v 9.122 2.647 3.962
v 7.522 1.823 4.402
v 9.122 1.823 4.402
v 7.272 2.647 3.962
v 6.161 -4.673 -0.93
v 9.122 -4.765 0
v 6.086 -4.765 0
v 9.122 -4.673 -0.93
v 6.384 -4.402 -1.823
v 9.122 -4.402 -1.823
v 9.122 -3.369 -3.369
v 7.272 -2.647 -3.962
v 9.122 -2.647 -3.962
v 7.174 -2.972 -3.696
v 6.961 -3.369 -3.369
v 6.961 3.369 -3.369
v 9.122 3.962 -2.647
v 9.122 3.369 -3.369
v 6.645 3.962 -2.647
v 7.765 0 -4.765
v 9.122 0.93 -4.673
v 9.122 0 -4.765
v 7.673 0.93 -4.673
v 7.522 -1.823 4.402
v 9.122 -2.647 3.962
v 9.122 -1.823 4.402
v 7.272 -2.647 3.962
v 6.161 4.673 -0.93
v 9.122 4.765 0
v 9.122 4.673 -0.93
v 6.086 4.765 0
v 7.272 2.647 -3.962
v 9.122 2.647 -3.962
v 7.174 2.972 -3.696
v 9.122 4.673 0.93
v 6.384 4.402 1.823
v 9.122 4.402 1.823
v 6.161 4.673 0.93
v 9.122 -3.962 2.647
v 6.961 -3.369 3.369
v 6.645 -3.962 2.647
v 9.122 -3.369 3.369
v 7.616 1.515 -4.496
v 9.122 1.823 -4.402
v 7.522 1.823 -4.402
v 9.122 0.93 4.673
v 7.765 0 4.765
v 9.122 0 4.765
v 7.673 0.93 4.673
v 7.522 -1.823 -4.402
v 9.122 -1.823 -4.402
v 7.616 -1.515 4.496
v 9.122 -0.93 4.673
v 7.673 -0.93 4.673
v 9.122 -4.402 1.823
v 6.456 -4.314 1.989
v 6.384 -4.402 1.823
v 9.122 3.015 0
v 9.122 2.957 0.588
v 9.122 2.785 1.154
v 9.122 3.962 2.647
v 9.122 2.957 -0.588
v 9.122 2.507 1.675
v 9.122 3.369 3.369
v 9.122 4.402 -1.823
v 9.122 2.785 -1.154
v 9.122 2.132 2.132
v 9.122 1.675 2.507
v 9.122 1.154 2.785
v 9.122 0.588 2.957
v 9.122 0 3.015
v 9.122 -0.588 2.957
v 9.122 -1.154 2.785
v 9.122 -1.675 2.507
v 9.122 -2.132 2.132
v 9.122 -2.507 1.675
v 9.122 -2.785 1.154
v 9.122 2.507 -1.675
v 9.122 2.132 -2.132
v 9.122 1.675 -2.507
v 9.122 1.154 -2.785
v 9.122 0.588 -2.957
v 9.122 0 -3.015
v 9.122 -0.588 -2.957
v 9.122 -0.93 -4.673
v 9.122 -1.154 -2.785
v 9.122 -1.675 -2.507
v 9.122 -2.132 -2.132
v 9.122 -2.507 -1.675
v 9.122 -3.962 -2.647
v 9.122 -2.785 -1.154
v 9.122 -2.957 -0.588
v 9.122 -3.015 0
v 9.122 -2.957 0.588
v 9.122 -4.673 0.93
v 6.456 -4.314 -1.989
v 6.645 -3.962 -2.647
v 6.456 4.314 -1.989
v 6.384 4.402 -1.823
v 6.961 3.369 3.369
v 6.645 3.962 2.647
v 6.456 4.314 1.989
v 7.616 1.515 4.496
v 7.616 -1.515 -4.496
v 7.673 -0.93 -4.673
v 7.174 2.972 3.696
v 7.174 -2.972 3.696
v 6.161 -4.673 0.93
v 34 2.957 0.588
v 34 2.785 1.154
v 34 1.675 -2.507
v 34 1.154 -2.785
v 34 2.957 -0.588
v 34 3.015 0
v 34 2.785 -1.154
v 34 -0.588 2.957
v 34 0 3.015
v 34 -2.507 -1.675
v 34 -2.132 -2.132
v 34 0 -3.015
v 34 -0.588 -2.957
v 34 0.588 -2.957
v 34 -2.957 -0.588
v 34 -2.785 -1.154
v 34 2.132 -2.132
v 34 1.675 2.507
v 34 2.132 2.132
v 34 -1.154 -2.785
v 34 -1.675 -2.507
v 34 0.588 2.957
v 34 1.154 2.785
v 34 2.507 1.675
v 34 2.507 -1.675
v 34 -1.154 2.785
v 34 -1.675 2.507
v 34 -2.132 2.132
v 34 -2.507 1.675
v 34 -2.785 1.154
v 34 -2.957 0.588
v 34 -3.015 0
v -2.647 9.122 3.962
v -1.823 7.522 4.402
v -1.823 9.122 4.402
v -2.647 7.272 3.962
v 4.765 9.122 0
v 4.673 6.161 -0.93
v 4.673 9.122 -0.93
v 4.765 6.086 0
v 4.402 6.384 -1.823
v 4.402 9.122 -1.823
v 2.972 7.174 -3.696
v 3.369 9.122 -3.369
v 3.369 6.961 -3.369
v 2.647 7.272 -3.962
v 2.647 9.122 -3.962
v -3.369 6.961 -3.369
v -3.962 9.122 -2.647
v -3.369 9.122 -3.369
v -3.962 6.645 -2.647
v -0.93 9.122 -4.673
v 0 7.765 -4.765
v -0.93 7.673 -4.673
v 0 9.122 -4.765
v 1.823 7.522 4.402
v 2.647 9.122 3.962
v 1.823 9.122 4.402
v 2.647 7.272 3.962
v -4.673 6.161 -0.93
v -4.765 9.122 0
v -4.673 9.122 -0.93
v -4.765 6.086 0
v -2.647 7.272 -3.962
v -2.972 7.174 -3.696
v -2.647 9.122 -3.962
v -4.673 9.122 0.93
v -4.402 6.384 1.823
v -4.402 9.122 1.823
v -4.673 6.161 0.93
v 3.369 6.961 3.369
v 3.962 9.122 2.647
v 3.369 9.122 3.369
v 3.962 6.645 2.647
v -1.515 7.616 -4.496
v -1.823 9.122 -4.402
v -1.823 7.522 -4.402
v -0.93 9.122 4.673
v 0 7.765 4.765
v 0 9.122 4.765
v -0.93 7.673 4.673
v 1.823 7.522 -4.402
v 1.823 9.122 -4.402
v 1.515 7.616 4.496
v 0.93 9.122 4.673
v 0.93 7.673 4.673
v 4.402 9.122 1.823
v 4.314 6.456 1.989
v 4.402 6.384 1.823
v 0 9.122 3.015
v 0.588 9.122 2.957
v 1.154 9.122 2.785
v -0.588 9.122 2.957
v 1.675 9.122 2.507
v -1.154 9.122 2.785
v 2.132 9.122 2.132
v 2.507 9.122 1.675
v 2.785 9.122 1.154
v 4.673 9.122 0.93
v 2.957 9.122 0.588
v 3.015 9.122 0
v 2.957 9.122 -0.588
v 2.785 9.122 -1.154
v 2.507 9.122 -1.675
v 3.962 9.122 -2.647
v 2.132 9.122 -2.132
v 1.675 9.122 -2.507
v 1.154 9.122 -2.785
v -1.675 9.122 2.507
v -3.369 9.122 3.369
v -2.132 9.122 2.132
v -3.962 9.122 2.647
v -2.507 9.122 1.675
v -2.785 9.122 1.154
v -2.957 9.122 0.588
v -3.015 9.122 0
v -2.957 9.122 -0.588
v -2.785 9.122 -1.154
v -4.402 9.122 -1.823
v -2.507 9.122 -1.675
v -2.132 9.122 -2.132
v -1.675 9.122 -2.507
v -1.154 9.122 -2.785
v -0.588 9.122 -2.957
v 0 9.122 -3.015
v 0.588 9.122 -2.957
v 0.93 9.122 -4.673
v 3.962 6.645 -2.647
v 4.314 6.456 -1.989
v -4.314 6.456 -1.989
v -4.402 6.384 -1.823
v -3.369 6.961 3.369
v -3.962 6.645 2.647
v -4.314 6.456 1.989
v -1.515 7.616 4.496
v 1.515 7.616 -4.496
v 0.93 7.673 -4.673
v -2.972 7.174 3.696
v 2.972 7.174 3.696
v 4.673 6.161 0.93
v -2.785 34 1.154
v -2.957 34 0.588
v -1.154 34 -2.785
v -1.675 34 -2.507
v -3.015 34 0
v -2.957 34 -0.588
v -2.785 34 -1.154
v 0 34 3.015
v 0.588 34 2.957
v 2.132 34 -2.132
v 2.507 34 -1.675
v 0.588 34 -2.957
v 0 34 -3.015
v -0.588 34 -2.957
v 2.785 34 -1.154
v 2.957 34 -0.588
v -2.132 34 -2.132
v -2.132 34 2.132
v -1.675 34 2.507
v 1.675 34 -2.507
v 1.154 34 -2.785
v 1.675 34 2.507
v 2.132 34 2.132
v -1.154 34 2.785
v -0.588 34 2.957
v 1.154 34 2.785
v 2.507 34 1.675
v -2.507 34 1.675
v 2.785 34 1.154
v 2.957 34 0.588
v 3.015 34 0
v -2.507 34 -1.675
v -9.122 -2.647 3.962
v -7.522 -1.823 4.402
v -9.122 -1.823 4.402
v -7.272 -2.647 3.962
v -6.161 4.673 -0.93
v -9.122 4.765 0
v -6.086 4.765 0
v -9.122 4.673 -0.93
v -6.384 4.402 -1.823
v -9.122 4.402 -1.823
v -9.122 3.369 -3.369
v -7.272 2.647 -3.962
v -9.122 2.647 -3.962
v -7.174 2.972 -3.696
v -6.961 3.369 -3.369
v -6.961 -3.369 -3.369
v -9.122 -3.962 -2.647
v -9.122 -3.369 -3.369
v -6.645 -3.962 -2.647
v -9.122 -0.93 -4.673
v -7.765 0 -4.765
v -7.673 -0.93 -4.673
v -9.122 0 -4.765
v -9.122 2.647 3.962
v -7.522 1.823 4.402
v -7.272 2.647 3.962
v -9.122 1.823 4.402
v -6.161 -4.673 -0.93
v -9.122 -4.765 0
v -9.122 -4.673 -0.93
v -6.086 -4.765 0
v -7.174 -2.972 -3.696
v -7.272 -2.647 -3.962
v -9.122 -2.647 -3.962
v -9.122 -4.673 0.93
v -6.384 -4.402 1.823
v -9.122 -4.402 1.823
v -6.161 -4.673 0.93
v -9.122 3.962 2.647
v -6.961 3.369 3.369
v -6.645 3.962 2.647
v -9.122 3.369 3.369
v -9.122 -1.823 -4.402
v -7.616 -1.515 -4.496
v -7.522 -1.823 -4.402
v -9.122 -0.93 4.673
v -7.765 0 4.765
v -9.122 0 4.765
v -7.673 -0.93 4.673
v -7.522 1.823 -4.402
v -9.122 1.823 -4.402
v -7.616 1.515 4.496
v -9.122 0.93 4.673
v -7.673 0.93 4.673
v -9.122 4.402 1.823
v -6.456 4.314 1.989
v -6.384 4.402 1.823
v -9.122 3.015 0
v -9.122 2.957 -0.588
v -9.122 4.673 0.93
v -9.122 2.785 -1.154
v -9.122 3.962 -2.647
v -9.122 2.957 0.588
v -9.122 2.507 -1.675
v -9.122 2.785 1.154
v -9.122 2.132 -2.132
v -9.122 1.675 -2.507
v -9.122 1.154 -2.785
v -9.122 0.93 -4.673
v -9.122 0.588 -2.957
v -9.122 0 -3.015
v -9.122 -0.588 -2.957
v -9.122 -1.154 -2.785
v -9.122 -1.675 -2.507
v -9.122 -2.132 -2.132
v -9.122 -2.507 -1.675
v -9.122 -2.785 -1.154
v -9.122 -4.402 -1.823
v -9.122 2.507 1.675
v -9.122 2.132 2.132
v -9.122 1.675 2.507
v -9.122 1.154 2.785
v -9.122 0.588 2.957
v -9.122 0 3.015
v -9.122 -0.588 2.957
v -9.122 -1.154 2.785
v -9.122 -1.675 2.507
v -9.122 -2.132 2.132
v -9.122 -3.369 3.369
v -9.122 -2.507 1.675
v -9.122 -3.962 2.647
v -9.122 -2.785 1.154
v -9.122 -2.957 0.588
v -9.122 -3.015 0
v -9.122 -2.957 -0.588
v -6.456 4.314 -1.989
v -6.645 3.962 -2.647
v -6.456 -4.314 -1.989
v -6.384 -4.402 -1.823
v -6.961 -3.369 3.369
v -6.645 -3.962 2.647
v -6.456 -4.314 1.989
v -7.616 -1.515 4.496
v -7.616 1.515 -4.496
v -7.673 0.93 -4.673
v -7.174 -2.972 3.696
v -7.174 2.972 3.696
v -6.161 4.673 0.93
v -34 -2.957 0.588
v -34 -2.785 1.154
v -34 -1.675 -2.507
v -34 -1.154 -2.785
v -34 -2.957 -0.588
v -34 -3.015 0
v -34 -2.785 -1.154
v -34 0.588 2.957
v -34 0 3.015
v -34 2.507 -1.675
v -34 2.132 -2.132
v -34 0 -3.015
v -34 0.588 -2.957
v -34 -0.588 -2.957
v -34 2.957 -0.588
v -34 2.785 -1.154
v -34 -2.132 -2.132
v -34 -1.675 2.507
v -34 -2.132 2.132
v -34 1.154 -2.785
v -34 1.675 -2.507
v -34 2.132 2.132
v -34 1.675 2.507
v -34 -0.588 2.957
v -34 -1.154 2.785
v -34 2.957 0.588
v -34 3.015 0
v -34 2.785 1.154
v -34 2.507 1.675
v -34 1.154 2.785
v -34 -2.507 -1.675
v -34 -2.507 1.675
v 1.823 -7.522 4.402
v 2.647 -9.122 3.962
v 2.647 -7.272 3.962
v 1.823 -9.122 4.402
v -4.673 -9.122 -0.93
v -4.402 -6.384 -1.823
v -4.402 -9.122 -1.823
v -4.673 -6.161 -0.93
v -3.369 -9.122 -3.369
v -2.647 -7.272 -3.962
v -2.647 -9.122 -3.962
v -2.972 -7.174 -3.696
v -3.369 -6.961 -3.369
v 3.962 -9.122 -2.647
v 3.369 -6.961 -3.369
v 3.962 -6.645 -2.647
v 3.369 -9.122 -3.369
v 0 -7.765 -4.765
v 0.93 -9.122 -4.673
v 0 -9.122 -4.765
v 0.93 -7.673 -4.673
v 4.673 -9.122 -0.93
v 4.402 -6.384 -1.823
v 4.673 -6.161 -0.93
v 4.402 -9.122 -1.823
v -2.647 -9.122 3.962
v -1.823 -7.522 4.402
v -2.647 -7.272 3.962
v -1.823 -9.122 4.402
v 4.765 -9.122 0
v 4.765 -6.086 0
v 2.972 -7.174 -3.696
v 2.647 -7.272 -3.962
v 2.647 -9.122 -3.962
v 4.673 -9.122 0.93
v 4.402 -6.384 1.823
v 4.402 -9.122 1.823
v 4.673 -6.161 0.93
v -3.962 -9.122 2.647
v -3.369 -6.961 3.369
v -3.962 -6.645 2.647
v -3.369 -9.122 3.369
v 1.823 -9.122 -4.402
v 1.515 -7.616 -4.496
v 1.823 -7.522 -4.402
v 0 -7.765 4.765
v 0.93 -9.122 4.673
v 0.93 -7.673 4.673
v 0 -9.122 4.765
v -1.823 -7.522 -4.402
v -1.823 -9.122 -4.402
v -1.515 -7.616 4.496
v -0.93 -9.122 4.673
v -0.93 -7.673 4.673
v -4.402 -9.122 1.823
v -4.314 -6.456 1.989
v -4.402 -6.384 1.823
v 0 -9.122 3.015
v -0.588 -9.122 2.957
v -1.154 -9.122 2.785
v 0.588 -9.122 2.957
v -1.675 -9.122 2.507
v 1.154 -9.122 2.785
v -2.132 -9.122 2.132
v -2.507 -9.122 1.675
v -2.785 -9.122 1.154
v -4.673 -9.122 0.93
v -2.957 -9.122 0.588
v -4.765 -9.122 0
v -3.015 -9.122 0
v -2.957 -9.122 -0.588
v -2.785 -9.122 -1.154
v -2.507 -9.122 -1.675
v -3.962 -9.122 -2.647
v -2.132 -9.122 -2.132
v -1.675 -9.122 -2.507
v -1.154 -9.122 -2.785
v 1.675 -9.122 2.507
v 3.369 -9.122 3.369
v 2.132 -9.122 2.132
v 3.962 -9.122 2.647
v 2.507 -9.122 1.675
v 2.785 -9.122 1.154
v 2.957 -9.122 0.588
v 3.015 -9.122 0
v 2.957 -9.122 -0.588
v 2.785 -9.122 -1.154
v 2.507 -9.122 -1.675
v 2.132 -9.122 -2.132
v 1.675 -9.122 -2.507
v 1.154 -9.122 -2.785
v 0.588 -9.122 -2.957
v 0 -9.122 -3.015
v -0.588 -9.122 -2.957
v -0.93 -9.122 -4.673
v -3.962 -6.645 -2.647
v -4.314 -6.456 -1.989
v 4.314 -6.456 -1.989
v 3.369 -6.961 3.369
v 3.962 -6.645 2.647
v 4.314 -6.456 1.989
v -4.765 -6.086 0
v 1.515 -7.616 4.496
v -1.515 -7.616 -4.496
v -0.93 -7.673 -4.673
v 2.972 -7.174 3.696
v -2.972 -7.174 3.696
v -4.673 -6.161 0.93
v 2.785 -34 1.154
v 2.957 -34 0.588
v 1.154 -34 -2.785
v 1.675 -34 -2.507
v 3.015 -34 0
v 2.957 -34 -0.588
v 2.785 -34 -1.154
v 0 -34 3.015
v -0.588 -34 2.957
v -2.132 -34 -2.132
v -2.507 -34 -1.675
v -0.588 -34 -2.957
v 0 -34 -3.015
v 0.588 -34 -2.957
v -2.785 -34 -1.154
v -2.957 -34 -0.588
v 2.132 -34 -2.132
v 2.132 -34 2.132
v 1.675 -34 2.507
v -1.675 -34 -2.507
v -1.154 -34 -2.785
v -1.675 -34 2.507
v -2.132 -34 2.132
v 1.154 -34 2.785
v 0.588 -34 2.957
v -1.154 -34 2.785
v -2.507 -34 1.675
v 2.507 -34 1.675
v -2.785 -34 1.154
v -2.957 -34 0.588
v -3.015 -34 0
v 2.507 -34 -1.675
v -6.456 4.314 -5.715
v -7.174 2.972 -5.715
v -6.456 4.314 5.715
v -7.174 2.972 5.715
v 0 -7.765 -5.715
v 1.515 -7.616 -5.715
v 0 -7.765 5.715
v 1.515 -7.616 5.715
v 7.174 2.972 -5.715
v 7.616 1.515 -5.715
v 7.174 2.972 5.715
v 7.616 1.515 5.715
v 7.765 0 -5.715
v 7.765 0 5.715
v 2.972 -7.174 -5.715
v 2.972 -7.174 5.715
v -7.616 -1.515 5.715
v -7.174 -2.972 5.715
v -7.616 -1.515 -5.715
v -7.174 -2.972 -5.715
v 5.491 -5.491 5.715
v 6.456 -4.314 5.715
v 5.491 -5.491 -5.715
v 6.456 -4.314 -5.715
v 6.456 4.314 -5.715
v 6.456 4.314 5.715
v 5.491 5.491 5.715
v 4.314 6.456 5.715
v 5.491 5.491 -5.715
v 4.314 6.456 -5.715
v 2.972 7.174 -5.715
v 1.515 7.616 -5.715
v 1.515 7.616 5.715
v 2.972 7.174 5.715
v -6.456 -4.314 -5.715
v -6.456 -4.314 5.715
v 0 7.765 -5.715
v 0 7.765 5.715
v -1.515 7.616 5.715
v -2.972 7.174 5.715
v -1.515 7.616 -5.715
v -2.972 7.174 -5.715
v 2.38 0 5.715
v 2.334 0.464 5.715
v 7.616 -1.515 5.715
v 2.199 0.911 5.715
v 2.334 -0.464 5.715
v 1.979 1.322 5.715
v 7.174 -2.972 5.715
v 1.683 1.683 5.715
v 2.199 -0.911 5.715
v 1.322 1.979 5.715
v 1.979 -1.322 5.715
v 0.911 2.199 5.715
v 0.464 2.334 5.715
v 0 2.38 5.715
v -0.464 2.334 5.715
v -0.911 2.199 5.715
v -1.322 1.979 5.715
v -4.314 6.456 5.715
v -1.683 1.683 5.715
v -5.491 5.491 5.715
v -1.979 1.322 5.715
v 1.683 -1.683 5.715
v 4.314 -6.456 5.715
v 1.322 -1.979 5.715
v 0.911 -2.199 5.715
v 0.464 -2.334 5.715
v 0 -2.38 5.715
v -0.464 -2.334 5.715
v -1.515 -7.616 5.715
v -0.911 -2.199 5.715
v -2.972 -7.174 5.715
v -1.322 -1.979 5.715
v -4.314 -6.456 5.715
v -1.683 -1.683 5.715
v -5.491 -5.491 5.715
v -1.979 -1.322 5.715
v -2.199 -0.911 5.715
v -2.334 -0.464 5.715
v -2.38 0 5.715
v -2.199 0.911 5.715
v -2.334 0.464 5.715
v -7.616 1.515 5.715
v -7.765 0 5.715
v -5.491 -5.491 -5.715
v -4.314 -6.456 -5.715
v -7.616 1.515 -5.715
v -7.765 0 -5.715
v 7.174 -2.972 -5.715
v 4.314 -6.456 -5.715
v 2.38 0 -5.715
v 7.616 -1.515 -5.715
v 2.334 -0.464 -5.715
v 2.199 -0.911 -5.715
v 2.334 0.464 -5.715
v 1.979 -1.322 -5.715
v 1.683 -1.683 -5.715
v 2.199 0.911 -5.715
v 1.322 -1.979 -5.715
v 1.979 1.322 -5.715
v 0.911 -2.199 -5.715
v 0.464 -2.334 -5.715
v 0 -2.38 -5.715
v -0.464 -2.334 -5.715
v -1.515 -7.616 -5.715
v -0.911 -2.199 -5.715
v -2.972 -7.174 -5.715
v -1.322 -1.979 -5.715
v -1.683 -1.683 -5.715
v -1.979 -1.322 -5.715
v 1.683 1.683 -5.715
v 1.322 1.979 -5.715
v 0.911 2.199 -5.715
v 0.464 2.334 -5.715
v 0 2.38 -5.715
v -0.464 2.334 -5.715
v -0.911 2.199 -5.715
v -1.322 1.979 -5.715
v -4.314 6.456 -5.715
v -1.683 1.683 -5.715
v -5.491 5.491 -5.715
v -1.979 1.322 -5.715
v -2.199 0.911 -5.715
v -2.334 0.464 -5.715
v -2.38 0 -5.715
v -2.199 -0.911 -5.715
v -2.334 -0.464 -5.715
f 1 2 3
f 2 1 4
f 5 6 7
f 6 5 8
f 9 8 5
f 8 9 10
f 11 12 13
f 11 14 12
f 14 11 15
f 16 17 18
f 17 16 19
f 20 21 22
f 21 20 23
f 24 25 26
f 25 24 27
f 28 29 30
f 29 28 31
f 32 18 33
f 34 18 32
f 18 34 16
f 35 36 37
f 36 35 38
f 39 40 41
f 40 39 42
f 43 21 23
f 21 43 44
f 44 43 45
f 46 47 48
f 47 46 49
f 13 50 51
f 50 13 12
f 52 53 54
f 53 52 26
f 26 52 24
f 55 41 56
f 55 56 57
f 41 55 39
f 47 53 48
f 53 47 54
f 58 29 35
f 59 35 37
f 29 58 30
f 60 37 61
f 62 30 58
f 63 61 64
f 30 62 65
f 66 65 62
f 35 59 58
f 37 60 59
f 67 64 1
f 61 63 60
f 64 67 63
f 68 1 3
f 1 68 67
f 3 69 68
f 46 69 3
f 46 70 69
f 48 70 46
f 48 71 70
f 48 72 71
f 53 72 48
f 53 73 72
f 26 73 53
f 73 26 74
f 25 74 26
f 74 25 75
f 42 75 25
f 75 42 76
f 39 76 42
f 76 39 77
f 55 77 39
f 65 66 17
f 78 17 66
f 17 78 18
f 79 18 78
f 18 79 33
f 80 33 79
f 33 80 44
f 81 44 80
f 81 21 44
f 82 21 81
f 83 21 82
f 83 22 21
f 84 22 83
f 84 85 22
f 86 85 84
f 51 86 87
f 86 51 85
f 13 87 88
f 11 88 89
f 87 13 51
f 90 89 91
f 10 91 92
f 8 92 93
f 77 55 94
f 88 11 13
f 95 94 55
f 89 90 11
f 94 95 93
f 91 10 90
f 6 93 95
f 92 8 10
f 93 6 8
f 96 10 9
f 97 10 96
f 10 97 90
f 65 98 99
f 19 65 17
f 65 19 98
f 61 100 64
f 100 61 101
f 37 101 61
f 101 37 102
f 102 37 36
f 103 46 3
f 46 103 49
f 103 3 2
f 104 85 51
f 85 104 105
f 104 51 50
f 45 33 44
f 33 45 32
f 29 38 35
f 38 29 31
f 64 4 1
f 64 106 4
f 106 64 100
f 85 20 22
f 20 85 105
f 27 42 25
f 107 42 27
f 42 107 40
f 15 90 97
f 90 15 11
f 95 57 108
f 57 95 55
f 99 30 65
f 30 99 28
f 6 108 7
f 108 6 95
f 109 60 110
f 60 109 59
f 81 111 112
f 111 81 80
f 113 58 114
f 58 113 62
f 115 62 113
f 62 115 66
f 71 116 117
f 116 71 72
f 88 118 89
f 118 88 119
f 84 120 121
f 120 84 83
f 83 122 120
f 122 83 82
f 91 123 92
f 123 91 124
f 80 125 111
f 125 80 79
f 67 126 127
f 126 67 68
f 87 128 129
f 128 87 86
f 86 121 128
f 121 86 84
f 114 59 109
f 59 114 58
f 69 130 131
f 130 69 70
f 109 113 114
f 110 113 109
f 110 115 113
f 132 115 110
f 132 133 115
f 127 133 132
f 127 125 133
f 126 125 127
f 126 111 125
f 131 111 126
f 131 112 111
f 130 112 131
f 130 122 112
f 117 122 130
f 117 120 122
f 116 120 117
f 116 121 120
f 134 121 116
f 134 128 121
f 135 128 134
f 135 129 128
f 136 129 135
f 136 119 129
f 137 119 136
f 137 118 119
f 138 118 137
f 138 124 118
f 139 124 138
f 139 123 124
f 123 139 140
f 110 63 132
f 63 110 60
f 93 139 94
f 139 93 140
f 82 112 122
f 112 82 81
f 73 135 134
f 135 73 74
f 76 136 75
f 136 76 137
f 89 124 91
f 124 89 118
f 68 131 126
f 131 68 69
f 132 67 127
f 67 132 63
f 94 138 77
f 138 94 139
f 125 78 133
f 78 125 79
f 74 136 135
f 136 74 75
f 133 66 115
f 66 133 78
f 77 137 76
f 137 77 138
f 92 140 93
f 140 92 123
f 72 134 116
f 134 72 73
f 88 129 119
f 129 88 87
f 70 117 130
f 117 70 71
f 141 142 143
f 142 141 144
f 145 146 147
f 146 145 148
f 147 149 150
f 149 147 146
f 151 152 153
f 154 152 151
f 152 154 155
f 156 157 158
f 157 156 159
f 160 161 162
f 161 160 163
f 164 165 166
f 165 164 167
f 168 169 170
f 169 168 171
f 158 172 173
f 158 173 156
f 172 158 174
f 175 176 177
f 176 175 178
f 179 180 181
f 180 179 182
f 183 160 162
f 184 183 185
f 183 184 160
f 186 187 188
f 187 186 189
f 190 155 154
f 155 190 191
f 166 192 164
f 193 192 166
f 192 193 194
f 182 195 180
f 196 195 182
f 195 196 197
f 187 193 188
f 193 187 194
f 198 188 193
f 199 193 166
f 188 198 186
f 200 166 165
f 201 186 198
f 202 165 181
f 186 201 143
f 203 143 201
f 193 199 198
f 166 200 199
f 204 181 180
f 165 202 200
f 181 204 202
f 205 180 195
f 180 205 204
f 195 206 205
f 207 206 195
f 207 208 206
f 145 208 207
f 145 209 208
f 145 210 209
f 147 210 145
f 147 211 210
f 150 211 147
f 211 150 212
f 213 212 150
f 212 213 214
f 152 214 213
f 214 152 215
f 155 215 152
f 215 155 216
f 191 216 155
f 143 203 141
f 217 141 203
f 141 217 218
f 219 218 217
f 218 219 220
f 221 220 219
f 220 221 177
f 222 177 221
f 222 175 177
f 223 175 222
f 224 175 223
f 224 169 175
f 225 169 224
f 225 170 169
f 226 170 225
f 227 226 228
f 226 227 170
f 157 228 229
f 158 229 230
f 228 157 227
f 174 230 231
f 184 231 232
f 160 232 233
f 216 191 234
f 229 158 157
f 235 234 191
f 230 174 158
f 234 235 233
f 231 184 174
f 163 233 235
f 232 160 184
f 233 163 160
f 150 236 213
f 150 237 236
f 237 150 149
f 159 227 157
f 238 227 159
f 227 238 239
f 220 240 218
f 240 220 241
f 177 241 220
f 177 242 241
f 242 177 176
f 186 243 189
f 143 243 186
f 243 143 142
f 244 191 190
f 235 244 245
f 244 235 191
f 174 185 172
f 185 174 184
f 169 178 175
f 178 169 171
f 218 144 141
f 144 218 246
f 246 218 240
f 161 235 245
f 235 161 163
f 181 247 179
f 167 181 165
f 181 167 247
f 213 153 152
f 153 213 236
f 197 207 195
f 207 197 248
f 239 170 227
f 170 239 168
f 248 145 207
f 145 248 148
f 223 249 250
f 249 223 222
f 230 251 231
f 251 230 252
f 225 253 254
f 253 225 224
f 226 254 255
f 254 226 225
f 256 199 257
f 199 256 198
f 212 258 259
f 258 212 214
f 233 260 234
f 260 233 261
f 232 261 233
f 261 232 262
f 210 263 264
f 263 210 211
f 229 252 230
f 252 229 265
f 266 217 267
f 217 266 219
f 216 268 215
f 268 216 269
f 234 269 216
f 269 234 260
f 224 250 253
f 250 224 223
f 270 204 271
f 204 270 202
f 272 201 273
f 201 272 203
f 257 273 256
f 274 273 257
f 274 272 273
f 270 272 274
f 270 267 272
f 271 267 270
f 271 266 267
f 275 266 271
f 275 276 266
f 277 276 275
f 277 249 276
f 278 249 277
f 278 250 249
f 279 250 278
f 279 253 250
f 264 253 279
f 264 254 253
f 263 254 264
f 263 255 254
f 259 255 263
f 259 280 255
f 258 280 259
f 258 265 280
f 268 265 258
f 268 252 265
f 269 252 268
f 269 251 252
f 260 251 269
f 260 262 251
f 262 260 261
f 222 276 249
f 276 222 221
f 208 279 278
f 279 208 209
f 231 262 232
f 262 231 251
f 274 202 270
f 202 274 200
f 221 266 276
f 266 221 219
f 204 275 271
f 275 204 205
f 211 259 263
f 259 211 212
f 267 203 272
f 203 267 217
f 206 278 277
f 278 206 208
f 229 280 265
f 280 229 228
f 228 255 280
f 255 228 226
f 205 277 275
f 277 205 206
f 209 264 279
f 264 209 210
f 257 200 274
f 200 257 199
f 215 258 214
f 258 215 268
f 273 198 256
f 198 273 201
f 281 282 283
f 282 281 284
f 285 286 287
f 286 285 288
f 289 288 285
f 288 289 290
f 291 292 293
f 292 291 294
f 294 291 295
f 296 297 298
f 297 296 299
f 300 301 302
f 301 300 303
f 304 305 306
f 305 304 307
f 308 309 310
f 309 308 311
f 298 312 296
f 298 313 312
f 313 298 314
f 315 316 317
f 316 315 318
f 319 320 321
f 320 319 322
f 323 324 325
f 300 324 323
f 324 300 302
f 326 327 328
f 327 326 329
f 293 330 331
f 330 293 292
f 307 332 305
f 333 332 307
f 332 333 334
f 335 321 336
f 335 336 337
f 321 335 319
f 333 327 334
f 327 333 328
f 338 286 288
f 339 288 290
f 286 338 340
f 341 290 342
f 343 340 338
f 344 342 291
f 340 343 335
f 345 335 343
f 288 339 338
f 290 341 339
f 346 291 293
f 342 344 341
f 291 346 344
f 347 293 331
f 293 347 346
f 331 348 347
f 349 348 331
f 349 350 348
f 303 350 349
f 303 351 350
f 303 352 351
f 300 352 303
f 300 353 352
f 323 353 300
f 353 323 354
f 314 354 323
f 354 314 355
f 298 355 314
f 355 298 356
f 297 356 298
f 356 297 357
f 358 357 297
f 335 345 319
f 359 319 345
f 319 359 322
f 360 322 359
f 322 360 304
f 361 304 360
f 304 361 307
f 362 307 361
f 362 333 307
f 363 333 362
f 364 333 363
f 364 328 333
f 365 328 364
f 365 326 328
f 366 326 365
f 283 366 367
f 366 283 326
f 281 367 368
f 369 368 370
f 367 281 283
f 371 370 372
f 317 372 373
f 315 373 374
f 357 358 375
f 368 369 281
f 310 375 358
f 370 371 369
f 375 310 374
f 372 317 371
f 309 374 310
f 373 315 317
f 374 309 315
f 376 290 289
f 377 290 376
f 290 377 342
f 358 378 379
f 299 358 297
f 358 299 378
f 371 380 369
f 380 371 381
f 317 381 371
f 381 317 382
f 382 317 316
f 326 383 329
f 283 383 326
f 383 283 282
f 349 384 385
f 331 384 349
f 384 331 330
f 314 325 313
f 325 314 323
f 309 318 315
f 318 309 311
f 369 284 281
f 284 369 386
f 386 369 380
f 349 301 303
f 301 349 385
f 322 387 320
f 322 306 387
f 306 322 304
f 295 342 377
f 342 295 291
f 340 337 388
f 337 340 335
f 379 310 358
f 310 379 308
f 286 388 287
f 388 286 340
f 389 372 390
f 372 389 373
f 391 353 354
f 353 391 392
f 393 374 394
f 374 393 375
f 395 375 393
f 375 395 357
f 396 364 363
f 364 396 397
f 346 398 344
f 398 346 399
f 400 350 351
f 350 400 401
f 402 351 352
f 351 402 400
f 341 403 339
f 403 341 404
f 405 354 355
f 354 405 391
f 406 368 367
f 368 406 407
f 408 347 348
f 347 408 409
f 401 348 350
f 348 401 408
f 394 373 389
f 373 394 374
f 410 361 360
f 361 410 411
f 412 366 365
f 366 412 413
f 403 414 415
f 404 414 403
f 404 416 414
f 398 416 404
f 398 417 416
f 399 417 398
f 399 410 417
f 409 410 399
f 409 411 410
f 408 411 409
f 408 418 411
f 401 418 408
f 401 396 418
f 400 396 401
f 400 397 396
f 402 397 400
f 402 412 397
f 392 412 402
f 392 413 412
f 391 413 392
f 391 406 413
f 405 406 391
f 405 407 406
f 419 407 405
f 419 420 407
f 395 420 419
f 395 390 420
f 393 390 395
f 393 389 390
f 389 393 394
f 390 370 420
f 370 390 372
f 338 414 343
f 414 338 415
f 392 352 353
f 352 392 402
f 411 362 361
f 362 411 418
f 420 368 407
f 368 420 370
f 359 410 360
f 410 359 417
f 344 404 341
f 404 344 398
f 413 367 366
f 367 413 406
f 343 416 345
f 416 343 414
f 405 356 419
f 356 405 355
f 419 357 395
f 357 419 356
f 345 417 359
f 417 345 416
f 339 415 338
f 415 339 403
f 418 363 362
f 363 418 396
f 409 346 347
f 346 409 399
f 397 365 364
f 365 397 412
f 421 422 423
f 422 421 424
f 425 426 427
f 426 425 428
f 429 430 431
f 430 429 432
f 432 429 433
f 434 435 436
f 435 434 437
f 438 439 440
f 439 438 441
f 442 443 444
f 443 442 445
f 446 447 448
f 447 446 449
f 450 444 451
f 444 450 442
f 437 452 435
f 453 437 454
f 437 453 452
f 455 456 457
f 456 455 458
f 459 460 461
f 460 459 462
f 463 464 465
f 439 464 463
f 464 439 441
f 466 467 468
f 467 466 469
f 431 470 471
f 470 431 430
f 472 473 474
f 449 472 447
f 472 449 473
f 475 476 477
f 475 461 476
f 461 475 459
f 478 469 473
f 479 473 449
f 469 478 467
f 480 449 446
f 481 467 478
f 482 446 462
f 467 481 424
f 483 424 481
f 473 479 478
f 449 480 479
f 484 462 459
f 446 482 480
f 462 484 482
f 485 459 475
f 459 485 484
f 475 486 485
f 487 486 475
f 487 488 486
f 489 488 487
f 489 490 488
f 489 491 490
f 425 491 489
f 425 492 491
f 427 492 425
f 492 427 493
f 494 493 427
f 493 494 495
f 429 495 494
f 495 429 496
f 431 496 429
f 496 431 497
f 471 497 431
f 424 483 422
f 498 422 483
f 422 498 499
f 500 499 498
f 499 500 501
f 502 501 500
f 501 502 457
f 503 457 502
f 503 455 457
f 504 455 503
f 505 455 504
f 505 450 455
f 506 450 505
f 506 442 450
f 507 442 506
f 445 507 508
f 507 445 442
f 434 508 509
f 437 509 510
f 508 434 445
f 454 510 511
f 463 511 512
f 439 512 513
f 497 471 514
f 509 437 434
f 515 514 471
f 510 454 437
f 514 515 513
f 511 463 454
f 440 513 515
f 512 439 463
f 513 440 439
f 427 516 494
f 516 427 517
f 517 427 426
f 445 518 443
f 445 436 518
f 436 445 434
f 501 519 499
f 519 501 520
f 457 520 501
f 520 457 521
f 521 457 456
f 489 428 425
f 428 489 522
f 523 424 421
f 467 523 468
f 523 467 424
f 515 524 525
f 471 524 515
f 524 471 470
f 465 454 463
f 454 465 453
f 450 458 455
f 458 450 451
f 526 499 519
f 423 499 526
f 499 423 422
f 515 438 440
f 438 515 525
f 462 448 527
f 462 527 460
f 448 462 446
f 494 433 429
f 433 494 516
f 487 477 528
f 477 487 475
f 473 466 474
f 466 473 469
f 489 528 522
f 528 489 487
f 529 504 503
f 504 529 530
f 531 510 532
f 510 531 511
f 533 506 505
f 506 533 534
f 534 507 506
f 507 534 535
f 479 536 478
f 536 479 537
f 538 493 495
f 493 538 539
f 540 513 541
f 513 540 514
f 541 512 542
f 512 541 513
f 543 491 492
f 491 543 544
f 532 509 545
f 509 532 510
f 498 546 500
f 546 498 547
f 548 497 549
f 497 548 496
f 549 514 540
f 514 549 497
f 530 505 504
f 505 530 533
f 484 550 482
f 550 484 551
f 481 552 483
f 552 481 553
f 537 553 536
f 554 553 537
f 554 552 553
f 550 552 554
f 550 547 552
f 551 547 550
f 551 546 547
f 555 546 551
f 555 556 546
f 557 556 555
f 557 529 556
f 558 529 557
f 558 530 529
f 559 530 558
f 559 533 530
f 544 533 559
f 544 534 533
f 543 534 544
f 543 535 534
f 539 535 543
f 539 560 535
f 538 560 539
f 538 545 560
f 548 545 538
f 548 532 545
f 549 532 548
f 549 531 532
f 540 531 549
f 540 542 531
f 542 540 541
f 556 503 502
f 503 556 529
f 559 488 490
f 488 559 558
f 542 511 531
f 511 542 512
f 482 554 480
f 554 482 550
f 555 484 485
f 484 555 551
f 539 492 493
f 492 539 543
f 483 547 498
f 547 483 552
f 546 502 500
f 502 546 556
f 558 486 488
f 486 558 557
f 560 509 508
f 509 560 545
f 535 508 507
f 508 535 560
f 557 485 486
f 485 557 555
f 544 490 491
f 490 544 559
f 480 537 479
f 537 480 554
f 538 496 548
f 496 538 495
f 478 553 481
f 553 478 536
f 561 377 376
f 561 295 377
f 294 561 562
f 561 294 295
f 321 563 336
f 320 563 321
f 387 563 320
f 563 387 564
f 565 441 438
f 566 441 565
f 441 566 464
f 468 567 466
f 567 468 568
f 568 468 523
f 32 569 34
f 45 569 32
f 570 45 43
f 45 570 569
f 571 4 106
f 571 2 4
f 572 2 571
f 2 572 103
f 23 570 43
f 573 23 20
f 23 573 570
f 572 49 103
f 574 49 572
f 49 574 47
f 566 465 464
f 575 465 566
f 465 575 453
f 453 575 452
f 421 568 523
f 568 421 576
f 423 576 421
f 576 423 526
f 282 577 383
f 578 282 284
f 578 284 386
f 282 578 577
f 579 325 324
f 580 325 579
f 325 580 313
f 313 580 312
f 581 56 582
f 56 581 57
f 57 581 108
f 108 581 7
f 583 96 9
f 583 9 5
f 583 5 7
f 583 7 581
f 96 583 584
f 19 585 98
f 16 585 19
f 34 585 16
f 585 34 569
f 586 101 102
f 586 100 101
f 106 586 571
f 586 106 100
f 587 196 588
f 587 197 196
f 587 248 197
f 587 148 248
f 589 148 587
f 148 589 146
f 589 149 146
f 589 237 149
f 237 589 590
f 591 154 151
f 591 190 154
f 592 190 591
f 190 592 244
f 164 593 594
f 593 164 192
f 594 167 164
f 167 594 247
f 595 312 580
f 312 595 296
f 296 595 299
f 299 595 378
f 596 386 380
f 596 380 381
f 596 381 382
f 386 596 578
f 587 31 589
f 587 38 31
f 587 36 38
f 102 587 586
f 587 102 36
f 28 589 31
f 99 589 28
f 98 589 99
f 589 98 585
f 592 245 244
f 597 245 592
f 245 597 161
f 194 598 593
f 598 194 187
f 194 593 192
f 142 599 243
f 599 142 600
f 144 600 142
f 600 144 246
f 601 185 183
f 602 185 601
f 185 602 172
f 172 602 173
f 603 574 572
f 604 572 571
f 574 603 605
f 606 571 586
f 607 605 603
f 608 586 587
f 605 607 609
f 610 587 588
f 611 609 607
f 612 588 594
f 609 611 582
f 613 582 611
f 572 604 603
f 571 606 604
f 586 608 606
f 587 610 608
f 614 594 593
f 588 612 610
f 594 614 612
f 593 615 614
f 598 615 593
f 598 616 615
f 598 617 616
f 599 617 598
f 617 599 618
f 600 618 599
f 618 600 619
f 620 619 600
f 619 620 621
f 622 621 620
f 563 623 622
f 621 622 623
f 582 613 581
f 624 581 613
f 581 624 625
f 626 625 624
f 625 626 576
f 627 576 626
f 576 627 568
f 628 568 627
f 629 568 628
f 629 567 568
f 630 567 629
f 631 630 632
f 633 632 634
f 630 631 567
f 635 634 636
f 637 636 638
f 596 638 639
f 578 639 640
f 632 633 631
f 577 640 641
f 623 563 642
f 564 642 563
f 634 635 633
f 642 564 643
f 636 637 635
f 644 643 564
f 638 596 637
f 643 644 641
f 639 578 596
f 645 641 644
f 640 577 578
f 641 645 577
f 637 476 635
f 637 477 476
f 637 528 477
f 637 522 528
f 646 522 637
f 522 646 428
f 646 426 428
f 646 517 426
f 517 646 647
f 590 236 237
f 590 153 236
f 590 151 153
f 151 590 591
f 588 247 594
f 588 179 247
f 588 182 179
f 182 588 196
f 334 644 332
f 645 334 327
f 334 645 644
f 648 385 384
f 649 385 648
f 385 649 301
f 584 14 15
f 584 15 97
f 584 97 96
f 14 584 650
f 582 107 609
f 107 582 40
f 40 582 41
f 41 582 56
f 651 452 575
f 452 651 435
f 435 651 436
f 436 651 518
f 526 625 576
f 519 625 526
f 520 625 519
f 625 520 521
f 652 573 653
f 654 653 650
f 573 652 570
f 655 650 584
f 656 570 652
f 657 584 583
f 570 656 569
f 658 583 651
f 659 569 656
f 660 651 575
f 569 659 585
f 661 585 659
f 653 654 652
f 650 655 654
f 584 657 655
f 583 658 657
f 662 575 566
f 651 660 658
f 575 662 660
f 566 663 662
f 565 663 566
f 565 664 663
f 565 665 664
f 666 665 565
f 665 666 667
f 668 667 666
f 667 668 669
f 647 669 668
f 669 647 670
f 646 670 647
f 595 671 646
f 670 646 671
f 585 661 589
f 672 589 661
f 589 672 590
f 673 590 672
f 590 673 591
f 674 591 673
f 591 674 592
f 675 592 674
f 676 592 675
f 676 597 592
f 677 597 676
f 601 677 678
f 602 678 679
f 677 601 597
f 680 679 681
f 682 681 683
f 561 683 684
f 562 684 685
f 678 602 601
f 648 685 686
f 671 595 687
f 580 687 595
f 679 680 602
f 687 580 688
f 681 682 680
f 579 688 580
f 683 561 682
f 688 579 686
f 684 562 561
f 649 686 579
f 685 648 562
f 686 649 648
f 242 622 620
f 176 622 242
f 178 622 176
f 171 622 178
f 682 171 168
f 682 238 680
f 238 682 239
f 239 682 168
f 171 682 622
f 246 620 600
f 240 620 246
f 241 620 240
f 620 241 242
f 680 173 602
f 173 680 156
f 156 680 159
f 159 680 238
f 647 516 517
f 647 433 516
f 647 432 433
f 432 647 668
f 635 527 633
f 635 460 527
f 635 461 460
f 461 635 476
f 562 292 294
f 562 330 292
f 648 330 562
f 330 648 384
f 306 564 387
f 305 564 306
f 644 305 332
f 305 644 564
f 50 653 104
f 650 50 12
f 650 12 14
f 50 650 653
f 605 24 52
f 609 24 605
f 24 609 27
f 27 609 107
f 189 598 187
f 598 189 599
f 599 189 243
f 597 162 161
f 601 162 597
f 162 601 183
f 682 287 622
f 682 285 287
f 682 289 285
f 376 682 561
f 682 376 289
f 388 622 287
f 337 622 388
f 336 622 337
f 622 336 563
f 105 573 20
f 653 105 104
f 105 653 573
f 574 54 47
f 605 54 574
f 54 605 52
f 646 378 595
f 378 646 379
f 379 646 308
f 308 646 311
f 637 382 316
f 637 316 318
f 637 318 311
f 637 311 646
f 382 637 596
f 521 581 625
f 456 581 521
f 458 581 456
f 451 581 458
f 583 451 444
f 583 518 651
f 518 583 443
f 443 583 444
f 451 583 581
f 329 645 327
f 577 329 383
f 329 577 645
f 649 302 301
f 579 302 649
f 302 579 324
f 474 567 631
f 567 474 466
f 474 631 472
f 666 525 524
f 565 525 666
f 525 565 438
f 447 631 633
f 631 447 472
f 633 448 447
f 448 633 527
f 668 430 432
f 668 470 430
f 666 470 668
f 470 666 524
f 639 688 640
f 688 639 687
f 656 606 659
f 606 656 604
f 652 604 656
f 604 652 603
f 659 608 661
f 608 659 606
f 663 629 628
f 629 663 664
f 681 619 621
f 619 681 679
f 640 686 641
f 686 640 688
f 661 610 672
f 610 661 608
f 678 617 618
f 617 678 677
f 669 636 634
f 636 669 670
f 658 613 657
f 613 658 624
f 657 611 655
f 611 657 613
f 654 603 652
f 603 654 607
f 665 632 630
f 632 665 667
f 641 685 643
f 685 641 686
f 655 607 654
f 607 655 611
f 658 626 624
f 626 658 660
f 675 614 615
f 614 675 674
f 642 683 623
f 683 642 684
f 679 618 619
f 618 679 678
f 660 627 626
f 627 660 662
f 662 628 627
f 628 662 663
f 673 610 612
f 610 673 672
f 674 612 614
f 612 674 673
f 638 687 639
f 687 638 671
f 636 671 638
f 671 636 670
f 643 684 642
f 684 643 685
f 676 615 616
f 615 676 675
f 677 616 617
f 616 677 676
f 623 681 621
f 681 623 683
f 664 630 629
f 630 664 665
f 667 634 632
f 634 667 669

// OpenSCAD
$fn = 32;

// ----------------------------------------------------------------------
// Cardan cross: 68 mm span, 9.53 mm trunnions
// ----------------------------------------------------------------------

// --- parameters (mm) ---
journal_d = 9.53;         // trunnion diameter
arm_len = 34;             // trunnion length from the centre
step_r = 3.24;            // step position from the centre
step_d = 6.03;            // journal diameter after the step
hub_d = 15.53;            // hub diameter
hub_h = 11.43;            // hub height
bore_d = 4.76;            // hub bore

difference() {
  union() {
    /* hub along the joint axis */
    cylinder(h = hub_h, d = hub_d, center = true);
    for (a = [0 : 90 : 270]) rotate([0, 0, a]) {
      /* trunnion, sunk into the hub */
      translate([hub_d / 4, 0, 0]) rotate([0, 90, 0]) cylinder(h = step_r + 2, d = journal_d);
      /* stepped journal out to the tip */
      translate([step_r - 0.5, 0, 0]) rotate([0, 90, 0]) cylinder(h = arm_len + 0.5 - step_r, d = step_d);
    }
  }
  /* lubrication bore through the hub, 2.5 mm clear on both sides */
  translate([0, 0, -hub_h / 2 - 2.5]) cylinder(h = hub_h + 5, d = bore_d);
}
